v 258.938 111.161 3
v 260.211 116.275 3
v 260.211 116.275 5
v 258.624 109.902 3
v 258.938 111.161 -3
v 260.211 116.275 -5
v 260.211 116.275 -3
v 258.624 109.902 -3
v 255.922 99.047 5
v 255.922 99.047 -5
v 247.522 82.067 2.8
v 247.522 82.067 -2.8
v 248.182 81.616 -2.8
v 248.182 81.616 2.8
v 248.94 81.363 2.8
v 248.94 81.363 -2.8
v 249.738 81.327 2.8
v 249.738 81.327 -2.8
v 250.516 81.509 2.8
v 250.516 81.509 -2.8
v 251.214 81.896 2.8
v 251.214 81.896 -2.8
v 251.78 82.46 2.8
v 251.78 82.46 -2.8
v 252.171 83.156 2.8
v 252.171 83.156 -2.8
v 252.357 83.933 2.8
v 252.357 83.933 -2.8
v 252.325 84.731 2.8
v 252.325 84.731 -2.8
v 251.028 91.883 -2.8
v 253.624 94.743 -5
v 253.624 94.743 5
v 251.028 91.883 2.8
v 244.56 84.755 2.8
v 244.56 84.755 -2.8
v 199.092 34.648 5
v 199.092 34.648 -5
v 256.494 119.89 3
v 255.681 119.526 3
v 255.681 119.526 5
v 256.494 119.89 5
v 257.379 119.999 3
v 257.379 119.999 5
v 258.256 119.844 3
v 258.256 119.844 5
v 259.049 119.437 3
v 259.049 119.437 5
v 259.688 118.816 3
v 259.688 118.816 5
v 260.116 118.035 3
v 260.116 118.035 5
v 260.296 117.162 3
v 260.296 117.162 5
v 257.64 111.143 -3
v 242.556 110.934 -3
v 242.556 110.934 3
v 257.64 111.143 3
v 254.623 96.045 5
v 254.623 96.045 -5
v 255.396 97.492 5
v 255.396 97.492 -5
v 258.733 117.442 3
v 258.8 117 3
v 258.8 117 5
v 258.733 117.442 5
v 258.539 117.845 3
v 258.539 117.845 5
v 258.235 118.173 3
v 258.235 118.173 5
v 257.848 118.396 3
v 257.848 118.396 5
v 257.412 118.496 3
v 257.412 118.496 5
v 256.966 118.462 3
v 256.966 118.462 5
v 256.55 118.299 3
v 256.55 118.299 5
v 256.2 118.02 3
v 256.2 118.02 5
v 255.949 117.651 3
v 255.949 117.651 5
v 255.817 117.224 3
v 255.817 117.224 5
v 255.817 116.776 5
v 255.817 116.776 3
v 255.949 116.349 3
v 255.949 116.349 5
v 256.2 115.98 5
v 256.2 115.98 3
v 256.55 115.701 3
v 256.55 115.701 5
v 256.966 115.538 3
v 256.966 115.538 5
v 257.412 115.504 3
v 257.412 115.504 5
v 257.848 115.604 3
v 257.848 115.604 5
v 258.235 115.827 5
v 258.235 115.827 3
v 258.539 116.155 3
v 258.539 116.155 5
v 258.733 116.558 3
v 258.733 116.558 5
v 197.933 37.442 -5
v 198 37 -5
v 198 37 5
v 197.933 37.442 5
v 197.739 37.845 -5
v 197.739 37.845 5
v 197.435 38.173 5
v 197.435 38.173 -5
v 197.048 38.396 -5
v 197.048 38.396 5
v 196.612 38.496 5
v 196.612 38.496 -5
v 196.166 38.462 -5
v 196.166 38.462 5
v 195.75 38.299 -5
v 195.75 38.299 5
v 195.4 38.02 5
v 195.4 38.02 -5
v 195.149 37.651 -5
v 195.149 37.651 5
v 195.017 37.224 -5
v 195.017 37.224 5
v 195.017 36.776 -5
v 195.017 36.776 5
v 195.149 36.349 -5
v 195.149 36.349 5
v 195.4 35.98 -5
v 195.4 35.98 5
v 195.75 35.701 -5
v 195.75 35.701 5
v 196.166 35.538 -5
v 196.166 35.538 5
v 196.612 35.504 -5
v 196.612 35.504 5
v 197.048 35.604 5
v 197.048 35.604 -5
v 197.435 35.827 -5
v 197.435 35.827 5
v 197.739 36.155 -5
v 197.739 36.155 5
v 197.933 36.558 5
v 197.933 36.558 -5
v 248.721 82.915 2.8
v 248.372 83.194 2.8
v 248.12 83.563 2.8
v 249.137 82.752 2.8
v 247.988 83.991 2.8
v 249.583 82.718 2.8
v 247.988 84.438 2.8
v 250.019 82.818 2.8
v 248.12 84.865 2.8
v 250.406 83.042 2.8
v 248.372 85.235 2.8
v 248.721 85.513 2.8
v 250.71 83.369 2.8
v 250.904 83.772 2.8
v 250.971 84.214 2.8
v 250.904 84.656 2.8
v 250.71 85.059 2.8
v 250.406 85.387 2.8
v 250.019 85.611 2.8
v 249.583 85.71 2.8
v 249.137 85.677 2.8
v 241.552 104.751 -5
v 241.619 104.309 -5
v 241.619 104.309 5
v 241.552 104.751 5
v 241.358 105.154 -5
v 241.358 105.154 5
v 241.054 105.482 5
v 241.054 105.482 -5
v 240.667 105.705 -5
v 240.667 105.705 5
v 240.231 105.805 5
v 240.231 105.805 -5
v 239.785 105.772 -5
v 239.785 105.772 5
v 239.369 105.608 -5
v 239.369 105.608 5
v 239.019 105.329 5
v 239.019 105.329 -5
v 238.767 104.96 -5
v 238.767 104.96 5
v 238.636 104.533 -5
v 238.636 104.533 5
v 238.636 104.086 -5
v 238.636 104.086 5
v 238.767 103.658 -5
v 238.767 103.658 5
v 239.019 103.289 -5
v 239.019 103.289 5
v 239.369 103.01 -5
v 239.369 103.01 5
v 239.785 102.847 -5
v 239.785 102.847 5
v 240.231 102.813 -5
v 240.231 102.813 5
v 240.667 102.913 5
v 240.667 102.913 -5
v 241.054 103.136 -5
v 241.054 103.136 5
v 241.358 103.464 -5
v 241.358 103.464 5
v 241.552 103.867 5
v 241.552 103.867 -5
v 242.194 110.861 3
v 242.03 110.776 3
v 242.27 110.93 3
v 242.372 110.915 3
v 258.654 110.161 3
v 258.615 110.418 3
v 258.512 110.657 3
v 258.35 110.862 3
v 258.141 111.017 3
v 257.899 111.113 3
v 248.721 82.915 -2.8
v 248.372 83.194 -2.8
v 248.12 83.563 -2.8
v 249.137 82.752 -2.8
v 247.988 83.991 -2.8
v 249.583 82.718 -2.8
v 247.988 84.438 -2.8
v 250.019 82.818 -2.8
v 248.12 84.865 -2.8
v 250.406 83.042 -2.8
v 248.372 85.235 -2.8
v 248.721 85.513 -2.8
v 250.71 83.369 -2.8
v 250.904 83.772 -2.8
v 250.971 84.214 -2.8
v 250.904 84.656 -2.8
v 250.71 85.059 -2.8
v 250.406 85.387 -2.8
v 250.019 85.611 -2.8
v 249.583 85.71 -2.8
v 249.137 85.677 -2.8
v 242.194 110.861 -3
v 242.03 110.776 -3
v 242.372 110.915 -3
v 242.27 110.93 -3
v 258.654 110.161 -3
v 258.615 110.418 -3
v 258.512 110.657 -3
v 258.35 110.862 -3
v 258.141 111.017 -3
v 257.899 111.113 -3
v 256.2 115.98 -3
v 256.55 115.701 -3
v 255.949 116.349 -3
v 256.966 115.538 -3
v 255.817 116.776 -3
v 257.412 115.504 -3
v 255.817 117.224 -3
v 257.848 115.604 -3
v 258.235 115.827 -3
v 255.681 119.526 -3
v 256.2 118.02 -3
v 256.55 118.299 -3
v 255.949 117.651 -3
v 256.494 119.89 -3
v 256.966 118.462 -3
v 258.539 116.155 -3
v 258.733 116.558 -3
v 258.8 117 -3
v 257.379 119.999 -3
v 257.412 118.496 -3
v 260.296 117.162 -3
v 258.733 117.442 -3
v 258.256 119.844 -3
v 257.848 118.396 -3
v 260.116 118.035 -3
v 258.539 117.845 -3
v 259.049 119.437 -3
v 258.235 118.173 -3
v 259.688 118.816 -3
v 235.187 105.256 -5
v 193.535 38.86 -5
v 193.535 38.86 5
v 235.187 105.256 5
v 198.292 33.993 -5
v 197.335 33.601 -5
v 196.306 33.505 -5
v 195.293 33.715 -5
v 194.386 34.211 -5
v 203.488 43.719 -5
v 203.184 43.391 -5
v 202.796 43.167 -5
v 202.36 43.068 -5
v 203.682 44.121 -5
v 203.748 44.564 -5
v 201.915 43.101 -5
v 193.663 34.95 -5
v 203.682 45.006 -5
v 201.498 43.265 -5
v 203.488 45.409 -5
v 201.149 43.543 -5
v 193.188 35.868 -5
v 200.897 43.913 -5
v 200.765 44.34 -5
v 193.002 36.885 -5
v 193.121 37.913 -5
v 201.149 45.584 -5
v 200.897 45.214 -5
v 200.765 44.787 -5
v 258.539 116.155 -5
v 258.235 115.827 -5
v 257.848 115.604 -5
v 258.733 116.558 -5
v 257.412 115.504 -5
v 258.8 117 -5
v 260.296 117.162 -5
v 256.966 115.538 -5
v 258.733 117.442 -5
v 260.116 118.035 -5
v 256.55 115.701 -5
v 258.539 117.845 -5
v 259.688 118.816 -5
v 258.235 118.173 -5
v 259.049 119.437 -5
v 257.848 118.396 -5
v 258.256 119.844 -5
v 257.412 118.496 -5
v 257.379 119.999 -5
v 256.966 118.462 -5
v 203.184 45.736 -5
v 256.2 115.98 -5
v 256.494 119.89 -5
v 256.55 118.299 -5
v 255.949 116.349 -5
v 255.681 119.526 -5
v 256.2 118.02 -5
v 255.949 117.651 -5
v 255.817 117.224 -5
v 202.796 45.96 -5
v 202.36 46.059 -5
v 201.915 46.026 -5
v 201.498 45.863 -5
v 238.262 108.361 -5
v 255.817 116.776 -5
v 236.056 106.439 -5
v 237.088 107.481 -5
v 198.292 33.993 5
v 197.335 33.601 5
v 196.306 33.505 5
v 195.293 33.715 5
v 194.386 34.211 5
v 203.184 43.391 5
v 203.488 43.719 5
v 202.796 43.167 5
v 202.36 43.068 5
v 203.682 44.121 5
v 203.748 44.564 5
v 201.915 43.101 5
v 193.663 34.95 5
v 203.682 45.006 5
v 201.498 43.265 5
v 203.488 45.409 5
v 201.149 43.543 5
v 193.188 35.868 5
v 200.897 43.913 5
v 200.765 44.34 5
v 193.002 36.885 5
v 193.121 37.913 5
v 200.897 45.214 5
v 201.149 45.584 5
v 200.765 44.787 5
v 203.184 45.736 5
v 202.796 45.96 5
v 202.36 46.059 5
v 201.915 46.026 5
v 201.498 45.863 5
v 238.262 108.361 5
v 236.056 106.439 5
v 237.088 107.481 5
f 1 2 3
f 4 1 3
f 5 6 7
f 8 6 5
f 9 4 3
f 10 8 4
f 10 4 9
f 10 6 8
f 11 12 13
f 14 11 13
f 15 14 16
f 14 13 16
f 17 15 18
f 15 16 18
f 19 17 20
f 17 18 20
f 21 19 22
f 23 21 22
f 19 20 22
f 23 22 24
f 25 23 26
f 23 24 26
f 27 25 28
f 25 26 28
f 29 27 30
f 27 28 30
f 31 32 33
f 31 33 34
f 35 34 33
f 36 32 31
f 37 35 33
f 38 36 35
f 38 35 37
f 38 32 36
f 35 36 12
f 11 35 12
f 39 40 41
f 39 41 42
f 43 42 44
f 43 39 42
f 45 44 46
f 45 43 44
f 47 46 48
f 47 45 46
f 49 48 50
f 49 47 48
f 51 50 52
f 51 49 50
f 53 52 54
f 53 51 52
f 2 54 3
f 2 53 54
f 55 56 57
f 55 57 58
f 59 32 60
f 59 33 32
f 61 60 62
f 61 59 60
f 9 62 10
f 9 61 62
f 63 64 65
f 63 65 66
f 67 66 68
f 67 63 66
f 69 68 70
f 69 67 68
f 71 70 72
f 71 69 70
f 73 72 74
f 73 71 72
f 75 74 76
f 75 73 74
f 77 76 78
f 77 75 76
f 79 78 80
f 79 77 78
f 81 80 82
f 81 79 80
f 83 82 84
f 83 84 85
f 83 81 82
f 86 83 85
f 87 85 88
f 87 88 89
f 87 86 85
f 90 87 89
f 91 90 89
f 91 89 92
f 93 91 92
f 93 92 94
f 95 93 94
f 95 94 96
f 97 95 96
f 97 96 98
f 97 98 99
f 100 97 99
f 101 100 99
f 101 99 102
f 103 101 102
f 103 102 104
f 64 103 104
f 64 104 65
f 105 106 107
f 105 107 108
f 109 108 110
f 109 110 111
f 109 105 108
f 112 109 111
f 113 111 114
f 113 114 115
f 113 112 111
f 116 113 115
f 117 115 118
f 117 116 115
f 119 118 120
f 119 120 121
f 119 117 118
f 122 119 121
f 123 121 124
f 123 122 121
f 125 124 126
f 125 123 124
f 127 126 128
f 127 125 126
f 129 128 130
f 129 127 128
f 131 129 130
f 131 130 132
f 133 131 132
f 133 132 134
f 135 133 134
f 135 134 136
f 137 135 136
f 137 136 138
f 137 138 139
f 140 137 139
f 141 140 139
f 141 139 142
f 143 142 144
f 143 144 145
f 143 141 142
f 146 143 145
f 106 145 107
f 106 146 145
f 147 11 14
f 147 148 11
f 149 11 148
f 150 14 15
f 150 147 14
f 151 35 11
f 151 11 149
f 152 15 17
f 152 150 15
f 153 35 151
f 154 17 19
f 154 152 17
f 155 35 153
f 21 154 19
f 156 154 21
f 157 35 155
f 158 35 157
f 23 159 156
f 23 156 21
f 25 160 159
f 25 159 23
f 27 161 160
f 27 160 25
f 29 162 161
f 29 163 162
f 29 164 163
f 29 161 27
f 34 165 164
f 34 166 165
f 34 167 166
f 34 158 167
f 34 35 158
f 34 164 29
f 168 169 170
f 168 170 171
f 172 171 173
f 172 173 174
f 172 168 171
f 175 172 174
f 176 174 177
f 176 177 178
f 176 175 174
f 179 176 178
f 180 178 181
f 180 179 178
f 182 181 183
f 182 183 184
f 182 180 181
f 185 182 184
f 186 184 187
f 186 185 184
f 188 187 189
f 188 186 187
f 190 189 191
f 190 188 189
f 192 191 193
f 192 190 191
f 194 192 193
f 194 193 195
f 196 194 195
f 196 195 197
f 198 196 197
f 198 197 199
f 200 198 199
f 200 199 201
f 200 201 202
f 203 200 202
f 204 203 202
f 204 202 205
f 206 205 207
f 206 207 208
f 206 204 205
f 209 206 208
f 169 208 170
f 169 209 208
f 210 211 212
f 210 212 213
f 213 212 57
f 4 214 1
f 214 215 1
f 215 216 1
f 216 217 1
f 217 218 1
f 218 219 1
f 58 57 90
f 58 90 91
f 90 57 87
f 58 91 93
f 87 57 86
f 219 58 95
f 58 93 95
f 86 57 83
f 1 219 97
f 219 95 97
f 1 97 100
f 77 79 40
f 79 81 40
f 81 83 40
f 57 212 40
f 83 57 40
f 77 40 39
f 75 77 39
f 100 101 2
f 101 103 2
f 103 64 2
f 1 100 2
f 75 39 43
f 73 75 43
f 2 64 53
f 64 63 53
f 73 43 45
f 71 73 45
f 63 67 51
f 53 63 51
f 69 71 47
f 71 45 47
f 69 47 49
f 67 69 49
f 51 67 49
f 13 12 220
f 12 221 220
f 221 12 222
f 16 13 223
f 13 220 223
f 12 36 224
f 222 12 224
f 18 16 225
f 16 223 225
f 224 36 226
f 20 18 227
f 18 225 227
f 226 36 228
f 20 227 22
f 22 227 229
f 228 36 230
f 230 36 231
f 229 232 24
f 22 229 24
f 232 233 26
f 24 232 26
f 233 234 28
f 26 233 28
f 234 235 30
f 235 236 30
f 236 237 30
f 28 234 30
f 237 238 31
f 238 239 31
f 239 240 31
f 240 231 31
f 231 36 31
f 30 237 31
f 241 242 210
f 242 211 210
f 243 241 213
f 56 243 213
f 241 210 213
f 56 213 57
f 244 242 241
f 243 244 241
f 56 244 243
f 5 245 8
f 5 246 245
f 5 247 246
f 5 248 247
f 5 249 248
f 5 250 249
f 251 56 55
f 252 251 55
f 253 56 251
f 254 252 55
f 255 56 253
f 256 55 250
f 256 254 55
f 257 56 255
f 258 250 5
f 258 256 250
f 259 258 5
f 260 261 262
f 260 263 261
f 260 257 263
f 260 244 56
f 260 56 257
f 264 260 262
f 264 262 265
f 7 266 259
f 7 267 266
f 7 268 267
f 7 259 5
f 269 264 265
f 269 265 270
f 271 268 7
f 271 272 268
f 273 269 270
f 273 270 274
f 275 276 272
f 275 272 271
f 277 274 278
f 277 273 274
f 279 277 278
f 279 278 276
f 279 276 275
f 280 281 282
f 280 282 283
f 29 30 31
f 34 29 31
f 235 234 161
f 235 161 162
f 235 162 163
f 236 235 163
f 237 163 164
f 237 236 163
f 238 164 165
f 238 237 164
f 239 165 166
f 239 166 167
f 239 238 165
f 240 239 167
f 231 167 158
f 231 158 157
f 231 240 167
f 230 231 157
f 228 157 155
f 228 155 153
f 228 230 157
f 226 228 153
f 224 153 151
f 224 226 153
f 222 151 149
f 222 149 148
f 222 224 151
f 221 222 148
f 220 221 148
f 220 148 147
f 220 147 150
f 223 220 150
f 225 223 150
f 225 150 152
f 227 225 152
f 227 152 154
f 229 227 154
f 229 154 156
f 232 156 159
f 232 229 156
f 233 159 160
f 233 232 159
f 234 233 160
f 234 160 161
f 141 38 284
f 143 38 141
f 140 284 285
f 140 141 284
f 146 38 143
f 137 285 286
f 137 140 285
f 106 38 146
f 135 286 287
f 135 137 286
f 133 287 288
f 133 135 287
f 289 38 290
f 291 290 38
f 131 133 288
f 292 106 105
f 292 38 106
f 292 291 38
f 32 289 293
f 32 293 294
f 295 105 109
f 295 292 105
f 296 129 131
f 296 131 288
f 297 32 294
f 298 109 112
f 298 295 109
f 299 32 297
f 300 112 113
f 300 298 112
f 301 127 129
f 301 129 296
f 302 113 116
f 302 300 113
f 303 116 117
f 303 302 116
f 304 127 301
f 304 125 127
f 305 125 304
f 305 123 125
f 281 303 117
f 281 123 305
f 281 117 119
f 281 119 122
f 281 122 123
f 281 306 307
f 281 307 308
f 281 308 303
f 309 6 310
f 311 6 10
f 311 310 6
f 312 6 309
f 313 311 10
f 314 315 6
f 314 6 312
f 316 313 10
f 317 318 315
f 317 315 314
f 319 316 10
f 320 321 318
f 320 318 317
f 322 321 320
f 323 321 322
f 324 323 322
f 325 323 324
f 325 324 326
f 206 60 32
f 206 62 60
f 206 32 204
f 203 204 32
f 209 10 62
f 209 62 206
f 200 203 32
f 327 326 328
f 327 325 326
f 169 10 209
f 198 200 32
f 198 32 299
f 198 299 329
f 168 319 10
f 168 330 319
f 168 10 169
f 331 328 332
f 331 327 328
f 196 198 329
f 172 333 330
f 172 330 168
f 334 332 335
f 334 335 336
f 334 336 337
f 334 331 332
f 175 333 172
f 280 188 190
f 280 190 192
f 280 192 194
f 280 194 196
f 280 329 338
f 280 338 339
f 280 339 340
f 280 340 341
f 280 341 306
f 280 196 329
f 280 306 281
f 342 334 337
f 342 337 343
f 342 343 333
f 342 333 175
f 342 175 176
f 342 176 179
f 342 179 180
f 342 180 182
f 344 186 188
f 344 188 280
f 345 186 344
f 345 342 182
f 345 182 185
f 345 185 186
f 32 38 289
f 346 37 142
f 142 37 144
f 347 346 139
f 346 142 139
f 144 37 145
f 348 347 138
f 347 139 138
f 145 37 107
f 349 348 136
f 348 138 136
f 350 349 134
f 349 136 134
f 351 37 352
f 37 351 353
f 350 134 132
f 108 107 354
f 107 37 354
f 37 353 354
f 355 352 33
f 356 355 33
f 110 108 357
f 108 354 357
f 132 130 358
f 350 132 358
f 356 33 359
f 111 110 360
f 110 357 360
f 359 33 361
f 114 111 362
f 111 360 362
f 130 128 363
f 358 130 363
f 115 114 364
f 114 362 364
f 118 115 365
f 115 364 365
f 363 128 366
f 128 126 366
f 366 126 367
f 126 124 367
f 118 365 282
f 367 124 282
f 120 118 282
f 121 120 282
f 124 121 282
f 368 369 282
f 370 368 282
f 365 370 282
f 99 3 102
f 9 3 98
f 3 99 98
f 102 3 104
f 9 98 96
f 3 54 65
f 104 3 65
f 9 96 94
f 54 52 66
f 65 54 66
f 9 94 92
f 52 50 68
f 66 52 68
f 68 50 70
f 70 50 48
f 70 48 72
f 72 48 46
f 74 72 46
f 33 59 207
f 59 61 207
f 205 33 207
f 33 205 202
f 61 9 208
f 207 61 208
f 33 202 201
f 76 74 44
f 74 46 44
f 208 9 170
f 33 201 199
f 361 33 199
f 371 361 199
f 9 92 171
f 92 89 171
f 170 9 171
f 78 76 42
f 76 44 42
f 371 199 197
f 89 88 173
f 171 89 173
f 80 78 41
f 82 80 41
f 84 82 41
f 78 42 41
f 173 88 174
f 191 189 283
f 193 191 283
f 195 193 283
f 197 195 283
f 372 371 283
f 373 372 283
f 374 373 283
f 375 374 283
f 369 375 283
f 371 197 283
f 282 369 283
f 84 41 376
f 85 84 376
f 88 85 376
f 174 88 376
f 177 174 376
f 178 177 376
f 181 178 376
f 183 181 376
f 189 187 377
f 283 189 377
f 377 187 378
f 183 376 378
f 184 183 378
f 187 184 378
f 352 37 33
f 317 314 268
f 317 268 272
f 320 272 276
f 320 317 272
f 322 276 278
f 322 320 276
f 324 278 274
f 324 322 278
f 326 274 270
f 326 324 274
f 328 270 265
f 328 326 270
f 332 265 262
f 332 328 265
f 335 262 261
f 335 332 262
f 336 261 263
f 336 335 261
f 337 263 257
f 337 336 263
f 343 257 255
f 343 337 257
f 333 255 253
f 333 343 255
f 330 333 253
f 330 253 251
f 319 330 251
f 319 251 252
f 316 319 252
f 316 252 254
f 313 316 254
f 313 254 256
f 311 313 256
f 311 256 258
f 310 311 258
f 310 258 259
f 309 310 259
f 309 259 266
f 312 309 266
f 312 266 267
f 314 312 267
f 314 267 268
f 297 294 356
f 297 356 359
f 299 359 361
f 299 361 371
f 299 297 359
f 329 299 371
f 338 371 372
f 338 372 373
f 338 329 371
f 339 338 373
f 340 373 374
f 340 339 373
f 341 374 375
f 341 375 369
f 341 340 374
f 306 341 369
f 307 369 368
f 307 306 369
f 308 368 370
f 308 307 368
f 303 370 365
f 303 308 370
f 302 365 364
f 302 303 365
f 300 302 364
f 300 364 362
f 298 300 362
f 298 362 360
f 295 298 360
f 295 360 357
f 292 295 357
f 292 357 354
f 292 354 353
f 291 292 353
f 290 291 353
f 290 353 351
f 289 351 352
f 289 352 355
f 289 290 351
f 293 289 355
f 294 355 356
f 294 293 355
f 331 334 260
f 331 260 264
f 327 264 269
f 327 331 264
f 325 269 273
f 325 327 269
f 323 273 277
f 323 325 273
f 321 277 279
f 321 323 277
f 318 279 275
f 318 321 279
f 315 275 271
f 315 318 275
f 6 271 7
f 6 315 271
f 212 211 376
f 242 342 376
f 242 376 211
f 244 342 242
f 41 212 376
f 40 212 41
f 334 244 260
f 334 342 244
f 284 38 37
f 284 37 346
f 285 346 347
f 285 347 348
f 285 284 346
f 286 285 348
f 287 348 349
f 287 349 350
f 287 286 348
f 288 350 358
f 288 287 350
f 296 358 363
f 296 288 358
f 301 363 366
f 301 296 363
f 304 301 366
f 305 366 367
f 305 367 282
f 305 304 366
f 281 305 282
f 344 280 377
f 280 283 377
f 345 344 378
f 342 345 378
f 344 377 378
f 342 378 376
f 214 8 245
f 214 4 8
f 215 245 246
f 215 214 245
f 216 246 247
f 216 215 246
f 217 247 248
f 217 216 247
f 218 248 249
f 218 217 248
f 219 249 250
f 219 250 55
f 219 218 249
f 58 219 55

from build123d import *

# Parameters (mm, degrees)
EXTRUDE_1_DEPTH          = 5
EXTRUDE_1_DEPTH_BACK     = 5
SKETCH_1_R               = 1.5
CUT_EXTRUDE_1_DEPTH      = 3
CUT_EXTRUDE_1_DEPTH_BACK = 3
SKETCH_2_R               = 1.5
EXTRUDE_4_DEPTH          = 2.8
EXTRUDE_4_DEPTH_BACK     = 2.8
SKETCH_3_R               = 1.5
FILLET_1_R               = 10
FILLET_2_R               = 1


with BuildPart() as part:
    # 草图1 → 凸台-拉伸1 (new, two sides: drawn at the far end of the back side and taken through both)
    with BuildSketch(Plane.XY.offset(-EXTRUDE_1_DEPTH_BACK)):
        with BuildLine():
            Line((255.314096956, 96.605744176), (199.091935004, 34.648006604))
            ThreePointArc((199.091935004, 34.648006604), (194.385791324, 34.210713053), (193.535103741, 38.859943595))
            Line((193.535103741, 38.859943595), (236.376857538, 107.153065983))
            Line((236.376857538, 107.153065983), (255.681175992, 119.525749162))
            ThreePointArc((255.681175992, 119.525749162), (259.048997407, 119.43741832), (260.211134207, 116.275225808))
            Line((260.211134207, 116.275225808), (255.314096956, 96.605744176))
        make_face()
        with Locations((196.5, 37)):
            Circle(SKETCH_1_R, mode=Mode.SUBTRACT)
        with Locations((202.248291042, 44.563540844)):
            Circle(SKETCH_1_R, mode=Mode.SUBTRACT)
        with Locations((257.3, 117)):
            Circle(SKETCH_1_R, mode=Mode.SUBTRACT)
        with Locations((240.118819851, 104.309174626)):
            Circle(SKETCH_1_R, mode=Mode.SUBTRACT)
    extrude(amount=EXTRUDE_1_DEPTH + EXTRUDE_1_DEPTH_BACK)

    # 草图2 → 切除-拉伸1 (cut, two sides: drawn at the far end of the back side and taken through both)
    with BuildSketch(Plane.XY.offset(-CUT_EXTRUDE_1_DEPTH_BACK)):
        with BuildLine():
            Line((255.681175992, 119.525749162), (242.27027225, 110.930322002))
            Line((242.27027225, 110.930322002), (258.937967915, 111.161415211))
            Line((258.937967915, 111.161415211), (260.211134207, 116.275225808))
            ThreePointArc((260.211134207, 116.275225808), (259.048997407, 119.43741832), (255.681175992, 119.525749162))
        make_face()
        with Locations((257.3, 117)):
            Circle(SKETCH_2_R, mode=Mode.SUBTRACT)
    extrude(amount=CUT_EXTRUDE_1_DEPTH + CUT_EXTRUDE_1_DEPTH_BACK, mode=Mode.SUBTRACT)

    # 草图3 → 凸台-拉伸4 (add, two sides: drawn at the far end of the back side and taken through both)
    with BuildSketch(Plane.XY.offset(-EXTRUDE_4_DEPTH_BACK)):
        with BuildLine():
            Line((244.560105761, 84.754670841), (247.522317194, 82.066678389))
            ThreePointArc((247.522317194, 82.066678389), (250.878196788, 81.678515203), (252.324623716, 84.731456021))
            Line((252.324623716, 84.731456021), (251.028481638, 91.882926341))
            Line((251.028481638, 91.882926341), (244.560105761, 84.754670841))
        make_face()
        with Locations((249.471111722, 84.214281678)):
            Circle(SKETCH_3_R, mode=Mode.SUBTRACT)
    extrude(amount=EXTRUDE_4_DEPTH + EXTRUDE_4_DEPTH_BACK)

    # 圆角1
    fillet_1_edges = [part.edges().sort_by_distance(p)[0] for p in [
        (236.376857538, 107.153065983, 0),
        (255.314096956, 96.605744176, 0),
    ]]
    fillet(fillet_1_edges, radius=FILLET_1_R)

    # 圆角2
    fillet_2_edges = [part.edges().sort_by_distance(p)[0] for p in [
        (258.937967915, 111.161415211, 0),
        (242.27027225, 110.930322002, 0),
    ]]
    fillet(fillet_2_edges, radius=FILLET_2_R)


solid = part.part
